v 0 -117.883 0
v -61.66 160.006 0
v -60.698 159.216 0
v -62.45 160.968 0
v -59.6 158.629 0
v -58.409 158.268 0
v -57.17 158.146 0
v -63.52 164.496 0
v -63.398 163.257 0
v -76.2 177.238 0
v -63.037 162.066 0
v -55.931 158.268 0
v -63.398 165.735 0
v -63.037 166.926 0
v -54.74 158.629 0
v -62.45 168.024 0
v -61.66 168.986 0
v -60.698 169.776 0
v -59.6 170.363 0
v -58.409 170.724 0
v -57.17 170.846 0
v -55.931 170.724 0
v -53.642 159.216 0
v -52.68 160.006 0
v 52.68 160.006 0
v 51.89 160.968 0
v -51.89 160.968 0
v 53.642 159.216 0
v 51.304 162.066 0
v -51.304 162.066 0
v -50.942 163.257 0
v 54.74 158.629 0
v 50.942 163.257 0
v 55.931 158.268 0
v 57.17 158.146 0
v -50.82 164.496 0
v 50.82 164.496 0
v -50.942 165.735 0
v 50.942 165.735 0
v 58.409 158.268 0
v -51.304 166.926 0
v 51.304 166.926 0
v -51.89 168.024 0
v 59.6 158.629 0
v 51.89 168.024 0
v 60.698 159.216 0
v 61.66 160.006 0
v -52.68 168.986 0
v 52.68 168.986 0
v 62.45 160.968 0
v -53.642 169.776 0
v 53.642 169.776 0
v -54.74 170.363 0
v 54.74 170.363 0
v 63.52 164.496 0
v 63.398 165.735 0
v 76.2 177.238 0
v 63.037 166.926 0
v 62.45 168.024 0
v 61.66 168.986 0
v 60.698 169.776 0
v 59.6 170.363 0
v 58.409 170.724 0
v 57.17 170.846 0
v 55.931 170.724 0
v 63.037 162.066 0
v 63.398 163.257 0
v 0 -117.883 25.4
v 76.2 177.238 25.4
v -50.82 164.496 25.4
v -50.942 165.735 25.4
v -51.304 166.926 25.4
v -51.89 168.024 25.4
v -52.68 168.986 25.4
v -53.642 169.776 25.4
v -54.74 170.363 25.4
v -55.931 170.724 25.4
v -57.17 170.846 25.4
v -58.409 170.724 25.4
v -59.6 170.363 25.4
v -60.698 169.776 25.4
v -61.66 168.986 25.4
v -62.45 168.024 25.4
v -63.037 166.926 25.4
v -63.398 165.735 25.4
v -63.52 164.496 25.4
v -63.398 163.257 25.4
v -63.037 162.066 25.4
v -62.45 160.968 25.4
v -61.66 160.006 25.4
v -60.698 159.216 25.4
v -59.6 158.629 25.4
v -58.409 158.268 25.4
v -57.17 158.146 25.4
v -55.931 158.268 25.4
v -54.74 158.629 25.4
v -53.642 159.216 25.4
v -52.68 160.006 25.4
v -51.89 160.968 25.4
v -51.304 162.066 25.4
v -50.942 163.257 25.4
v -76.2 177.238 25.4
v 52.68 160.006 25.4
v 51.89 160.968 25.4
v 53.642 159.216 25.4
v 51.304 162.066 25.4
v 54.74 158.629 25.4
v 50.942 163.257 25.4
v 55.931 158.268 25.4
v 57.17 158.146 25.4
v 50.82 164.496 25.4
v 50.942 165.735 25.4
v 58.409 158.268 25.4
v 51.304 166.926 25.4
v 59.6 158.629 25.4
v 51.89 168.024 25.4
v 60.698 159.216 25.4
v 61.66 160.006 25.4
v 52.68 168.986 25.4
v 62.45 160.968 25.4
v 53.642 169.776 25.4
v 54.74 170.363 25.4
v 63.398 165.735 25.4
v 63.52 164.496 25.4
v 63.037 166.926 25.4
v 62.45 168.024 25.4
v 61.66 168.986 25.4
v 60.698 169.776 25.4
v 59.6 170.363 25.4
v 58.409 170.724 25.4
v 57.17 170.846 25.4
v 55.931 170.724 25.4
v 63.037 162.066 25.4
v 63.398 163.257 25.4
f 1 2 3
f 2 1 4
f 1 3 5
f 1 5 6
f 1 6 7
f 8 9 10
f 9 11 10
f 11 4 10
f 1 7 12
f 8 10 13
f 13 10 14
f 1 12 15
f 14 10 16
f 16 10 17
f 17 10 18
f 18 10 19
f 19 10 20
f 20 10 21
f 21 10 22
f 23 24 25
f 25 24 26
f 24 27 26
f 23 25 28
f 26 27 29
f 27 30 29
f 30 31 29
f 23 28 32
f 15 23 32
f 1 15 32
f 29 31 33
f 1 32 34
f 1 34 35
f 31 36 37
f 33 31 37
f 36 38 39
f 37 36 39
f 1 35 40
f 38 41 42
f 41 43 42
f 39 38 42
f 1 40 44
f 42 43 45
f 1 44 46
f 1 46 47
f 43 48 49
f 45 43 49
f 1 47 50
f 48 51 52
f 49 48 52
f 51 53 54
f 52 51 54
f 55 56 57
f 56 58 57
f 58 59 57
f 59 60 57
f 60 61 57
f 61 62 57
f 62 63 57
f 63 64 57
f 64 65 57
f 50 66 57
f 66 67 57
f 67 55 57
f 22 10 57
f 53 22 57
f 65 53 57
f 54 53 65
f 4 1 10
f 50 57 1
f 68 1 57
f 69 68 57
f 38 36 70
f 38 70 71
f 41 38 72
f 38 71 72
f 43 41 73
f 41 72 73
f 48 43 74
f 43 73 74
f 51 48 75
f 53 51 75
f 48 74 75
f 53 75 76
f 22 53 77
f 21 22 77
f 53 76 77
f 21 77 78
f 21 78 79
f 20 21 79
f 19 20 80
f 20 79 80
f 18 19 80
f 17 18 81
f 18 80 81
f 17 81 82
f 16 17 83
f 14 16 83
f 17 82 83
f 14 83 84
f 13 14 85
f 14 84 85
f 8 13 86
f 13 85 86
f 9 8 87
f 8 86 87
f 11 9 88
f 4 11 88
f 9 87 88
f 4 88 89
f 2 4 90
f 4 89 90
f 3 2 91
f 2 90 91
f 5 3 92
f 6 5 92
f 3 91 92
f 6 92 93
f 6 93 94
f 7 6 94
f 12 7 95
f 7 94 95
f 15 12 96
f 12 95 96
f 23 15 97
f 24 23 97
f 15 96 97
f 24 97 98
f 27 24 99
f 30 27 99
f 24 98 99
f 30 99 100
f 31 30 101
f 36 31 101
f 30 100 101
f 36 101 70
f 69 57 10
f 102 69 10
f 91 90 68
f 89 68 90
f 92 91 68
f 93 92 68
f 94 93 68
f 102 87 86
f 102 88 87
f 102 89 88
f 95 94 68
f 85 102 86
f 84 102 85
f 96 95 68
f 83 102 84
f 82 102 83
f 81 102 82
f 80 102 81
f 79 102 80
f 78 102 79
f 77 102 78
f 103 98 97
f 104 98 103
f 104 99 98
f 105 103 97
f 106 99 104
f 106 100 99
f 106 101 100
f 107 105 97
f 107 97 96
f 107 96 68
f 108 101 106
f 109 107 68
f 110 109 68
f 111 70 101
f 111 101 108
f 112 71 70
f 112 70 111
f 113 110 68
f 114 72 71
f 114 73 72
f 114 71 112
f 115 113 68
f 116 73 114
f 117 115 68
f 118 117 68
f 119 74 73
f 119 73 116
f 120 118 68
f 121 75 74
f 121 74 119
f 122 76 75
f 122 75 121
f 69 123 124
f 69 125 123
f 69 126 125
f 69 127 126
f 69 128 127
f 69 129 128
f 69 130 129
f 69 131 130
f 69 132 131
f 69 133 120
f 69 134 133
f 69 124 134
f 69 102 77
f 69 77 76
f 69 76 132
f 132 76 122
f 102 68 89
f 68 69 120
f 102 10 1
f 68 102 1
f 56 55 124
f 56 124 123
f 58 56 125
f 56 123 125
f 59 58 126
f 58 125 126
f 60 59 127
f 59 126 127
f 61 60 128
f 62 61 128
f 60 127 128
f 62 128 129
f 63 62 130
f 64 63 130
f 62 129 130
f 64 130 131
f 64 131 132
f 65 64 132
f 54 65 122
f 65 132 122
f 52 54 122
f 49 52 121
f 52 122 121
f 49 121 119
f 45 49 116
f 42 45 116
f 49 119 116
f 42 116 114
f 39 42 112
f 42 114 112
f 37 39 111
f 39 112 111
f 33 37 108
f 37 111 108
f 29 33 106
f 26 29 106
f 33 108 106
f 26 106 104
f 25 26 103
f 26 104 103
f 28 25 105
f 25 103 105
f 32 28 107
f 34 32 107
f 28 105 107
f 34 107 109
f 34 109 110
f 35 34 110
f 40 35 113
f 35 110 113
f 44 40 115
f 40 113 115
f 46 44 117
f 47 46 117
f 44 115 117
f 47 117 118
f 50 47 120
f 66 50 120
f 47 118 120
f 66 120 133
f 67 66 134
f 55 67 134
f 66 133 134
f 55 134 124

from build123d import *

# Parameters (mm, degrees)
F1_DEPTH = 25.4
F2_R     = 6.35
F3_DEPTH = 25.4


with BuildPart() as f1:
    # F0 (on Top) → F1 (new body)
    with BuildSketch(Plane.XY):
        Polygon((76.2, 177.238014), (-76.2, 177.238014), (0, -117.883317), align=None)
    extrude(amount=F1_DEPTH)

    # F2 (on face) → F3 (cut)
    with BuildSketch(Plane.XY.offset(25.4)):
        with Locations((-57.170211, 164.495959)):
            Circle(F2_R)
        with Locations((57.170211, 164.495959)):
            Circle(F2_R)
    extrude(amount=-F3_DEPTH, mode=Mode.SUBTRACT)


solid = f1.part
